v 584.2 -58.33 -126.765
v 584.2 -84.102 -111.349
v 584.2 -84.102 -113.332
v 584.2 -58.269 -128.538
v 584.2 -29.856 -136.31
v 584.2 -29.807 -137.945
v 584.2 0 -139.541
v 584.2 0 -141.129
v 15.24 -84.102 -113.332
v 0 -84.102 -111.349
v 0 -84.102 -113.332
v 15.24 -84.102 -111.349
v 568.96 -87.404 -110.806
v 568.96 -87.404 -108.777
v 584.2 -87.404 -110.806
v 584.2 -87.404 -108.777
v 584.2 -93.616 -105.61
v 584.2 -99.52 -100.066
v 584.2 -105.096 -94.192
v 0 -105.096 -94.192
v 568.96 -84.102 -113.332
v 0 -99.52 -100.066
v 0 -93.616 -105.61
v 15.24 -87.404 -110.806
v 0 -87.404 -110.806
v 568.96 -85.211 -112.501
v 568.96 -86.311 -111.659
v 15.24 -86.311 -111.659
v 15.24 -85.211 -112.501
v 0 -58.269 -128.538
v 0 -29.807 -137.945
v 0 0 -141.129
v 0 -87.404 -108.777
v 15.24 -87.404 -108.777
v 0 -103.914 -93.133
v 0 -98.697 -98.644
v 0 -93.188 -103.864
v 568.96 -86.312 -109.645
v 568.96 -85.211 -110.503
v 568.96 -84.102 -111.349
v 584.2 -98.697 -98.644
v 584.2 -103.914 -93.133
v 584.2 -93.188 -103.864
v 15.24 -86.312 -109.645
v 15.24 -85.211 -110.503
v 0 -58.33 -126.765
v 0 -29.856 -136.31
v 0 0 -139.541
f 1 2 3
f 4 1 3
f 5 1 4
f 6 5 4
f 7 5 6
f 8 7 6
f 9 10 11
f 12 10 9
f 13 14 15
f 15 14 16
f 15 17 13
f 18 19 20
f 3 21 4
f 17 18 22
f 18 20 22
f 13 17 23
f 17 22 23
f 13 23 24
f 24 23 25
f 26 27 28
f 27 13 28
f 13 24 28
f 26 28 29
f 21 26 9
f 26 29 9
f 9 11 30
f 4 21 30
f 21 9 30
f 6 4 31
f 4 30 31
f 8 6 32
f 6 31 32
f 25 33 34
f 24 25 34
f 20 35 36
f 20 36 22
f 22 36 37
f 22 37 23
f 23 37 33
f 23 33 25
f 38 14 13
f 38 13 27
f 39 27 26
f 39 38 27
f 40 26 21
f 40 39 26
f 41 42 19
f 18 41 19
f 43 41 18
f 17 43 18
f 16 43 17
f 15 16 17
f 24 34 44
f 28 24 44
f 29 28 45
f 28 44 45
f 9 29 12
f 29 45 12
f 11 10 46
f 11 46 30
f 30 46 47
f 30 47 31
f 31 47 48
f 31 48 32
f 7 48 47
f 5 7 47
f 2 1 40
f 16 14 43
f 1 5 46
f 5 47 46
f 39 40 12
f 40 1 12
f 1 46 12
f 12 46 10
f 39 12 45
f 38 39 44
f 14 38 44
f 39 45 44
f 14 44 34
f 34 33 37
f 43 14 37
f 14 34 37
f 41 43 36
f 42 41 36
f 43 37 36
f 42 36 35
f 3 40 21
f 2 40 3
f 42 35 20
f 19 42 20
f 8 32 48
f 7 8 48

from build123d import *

# Parameters (mm, degrees)
EXTRUDE_THIN1_DEPTH = 584.2
SKETCH3_W           = 15.24
SKETCH3_H           = 3.302
CUT_EXTRUDE1_DEPTH  = 142.12875


with BuildPart() as part:
    # Sketch2 → Extrude-Thin1 (new body)
    with BuildSketch(Plane(origin=(0, 0, 0), x_dir=(0, 0, -1), z_dir=(1, 0, 0))):
        with BuildLine():
            ThreePointArc((94.192253267, -105.09587766), (128.861474149, -57.550365391), (141.12875, 0))
            Line((141.12875, 0), (139.54125, 0))
            ThreePointArc((139.54125, 0), (127.411963754, -56.903004701), (93.132722859, -103.913696809))
            Line((93.132722859, -103.913696809), (94.192253267, -105.09587766))
        make_face()
    extrude(amount=EXTRUDE_THIN1_DEPTH)

    # Sketch3 → Cut-Extrude1 (cut, through all)
    with BuildSketch(Plane.XY):
        with Locations((7.62, -85.752696809)):
            Rectangle(SKETCH3_W, SKETCH3_H)
        with Locations((576.58, -85.752696809)):
            Rectangle(SKETCH3_W, SKETCH3_H)
    extrude(amount=-CUT_EXTRUDE1_DEPTH, mode=Mode.SUBTRACT)


solid = part.part
